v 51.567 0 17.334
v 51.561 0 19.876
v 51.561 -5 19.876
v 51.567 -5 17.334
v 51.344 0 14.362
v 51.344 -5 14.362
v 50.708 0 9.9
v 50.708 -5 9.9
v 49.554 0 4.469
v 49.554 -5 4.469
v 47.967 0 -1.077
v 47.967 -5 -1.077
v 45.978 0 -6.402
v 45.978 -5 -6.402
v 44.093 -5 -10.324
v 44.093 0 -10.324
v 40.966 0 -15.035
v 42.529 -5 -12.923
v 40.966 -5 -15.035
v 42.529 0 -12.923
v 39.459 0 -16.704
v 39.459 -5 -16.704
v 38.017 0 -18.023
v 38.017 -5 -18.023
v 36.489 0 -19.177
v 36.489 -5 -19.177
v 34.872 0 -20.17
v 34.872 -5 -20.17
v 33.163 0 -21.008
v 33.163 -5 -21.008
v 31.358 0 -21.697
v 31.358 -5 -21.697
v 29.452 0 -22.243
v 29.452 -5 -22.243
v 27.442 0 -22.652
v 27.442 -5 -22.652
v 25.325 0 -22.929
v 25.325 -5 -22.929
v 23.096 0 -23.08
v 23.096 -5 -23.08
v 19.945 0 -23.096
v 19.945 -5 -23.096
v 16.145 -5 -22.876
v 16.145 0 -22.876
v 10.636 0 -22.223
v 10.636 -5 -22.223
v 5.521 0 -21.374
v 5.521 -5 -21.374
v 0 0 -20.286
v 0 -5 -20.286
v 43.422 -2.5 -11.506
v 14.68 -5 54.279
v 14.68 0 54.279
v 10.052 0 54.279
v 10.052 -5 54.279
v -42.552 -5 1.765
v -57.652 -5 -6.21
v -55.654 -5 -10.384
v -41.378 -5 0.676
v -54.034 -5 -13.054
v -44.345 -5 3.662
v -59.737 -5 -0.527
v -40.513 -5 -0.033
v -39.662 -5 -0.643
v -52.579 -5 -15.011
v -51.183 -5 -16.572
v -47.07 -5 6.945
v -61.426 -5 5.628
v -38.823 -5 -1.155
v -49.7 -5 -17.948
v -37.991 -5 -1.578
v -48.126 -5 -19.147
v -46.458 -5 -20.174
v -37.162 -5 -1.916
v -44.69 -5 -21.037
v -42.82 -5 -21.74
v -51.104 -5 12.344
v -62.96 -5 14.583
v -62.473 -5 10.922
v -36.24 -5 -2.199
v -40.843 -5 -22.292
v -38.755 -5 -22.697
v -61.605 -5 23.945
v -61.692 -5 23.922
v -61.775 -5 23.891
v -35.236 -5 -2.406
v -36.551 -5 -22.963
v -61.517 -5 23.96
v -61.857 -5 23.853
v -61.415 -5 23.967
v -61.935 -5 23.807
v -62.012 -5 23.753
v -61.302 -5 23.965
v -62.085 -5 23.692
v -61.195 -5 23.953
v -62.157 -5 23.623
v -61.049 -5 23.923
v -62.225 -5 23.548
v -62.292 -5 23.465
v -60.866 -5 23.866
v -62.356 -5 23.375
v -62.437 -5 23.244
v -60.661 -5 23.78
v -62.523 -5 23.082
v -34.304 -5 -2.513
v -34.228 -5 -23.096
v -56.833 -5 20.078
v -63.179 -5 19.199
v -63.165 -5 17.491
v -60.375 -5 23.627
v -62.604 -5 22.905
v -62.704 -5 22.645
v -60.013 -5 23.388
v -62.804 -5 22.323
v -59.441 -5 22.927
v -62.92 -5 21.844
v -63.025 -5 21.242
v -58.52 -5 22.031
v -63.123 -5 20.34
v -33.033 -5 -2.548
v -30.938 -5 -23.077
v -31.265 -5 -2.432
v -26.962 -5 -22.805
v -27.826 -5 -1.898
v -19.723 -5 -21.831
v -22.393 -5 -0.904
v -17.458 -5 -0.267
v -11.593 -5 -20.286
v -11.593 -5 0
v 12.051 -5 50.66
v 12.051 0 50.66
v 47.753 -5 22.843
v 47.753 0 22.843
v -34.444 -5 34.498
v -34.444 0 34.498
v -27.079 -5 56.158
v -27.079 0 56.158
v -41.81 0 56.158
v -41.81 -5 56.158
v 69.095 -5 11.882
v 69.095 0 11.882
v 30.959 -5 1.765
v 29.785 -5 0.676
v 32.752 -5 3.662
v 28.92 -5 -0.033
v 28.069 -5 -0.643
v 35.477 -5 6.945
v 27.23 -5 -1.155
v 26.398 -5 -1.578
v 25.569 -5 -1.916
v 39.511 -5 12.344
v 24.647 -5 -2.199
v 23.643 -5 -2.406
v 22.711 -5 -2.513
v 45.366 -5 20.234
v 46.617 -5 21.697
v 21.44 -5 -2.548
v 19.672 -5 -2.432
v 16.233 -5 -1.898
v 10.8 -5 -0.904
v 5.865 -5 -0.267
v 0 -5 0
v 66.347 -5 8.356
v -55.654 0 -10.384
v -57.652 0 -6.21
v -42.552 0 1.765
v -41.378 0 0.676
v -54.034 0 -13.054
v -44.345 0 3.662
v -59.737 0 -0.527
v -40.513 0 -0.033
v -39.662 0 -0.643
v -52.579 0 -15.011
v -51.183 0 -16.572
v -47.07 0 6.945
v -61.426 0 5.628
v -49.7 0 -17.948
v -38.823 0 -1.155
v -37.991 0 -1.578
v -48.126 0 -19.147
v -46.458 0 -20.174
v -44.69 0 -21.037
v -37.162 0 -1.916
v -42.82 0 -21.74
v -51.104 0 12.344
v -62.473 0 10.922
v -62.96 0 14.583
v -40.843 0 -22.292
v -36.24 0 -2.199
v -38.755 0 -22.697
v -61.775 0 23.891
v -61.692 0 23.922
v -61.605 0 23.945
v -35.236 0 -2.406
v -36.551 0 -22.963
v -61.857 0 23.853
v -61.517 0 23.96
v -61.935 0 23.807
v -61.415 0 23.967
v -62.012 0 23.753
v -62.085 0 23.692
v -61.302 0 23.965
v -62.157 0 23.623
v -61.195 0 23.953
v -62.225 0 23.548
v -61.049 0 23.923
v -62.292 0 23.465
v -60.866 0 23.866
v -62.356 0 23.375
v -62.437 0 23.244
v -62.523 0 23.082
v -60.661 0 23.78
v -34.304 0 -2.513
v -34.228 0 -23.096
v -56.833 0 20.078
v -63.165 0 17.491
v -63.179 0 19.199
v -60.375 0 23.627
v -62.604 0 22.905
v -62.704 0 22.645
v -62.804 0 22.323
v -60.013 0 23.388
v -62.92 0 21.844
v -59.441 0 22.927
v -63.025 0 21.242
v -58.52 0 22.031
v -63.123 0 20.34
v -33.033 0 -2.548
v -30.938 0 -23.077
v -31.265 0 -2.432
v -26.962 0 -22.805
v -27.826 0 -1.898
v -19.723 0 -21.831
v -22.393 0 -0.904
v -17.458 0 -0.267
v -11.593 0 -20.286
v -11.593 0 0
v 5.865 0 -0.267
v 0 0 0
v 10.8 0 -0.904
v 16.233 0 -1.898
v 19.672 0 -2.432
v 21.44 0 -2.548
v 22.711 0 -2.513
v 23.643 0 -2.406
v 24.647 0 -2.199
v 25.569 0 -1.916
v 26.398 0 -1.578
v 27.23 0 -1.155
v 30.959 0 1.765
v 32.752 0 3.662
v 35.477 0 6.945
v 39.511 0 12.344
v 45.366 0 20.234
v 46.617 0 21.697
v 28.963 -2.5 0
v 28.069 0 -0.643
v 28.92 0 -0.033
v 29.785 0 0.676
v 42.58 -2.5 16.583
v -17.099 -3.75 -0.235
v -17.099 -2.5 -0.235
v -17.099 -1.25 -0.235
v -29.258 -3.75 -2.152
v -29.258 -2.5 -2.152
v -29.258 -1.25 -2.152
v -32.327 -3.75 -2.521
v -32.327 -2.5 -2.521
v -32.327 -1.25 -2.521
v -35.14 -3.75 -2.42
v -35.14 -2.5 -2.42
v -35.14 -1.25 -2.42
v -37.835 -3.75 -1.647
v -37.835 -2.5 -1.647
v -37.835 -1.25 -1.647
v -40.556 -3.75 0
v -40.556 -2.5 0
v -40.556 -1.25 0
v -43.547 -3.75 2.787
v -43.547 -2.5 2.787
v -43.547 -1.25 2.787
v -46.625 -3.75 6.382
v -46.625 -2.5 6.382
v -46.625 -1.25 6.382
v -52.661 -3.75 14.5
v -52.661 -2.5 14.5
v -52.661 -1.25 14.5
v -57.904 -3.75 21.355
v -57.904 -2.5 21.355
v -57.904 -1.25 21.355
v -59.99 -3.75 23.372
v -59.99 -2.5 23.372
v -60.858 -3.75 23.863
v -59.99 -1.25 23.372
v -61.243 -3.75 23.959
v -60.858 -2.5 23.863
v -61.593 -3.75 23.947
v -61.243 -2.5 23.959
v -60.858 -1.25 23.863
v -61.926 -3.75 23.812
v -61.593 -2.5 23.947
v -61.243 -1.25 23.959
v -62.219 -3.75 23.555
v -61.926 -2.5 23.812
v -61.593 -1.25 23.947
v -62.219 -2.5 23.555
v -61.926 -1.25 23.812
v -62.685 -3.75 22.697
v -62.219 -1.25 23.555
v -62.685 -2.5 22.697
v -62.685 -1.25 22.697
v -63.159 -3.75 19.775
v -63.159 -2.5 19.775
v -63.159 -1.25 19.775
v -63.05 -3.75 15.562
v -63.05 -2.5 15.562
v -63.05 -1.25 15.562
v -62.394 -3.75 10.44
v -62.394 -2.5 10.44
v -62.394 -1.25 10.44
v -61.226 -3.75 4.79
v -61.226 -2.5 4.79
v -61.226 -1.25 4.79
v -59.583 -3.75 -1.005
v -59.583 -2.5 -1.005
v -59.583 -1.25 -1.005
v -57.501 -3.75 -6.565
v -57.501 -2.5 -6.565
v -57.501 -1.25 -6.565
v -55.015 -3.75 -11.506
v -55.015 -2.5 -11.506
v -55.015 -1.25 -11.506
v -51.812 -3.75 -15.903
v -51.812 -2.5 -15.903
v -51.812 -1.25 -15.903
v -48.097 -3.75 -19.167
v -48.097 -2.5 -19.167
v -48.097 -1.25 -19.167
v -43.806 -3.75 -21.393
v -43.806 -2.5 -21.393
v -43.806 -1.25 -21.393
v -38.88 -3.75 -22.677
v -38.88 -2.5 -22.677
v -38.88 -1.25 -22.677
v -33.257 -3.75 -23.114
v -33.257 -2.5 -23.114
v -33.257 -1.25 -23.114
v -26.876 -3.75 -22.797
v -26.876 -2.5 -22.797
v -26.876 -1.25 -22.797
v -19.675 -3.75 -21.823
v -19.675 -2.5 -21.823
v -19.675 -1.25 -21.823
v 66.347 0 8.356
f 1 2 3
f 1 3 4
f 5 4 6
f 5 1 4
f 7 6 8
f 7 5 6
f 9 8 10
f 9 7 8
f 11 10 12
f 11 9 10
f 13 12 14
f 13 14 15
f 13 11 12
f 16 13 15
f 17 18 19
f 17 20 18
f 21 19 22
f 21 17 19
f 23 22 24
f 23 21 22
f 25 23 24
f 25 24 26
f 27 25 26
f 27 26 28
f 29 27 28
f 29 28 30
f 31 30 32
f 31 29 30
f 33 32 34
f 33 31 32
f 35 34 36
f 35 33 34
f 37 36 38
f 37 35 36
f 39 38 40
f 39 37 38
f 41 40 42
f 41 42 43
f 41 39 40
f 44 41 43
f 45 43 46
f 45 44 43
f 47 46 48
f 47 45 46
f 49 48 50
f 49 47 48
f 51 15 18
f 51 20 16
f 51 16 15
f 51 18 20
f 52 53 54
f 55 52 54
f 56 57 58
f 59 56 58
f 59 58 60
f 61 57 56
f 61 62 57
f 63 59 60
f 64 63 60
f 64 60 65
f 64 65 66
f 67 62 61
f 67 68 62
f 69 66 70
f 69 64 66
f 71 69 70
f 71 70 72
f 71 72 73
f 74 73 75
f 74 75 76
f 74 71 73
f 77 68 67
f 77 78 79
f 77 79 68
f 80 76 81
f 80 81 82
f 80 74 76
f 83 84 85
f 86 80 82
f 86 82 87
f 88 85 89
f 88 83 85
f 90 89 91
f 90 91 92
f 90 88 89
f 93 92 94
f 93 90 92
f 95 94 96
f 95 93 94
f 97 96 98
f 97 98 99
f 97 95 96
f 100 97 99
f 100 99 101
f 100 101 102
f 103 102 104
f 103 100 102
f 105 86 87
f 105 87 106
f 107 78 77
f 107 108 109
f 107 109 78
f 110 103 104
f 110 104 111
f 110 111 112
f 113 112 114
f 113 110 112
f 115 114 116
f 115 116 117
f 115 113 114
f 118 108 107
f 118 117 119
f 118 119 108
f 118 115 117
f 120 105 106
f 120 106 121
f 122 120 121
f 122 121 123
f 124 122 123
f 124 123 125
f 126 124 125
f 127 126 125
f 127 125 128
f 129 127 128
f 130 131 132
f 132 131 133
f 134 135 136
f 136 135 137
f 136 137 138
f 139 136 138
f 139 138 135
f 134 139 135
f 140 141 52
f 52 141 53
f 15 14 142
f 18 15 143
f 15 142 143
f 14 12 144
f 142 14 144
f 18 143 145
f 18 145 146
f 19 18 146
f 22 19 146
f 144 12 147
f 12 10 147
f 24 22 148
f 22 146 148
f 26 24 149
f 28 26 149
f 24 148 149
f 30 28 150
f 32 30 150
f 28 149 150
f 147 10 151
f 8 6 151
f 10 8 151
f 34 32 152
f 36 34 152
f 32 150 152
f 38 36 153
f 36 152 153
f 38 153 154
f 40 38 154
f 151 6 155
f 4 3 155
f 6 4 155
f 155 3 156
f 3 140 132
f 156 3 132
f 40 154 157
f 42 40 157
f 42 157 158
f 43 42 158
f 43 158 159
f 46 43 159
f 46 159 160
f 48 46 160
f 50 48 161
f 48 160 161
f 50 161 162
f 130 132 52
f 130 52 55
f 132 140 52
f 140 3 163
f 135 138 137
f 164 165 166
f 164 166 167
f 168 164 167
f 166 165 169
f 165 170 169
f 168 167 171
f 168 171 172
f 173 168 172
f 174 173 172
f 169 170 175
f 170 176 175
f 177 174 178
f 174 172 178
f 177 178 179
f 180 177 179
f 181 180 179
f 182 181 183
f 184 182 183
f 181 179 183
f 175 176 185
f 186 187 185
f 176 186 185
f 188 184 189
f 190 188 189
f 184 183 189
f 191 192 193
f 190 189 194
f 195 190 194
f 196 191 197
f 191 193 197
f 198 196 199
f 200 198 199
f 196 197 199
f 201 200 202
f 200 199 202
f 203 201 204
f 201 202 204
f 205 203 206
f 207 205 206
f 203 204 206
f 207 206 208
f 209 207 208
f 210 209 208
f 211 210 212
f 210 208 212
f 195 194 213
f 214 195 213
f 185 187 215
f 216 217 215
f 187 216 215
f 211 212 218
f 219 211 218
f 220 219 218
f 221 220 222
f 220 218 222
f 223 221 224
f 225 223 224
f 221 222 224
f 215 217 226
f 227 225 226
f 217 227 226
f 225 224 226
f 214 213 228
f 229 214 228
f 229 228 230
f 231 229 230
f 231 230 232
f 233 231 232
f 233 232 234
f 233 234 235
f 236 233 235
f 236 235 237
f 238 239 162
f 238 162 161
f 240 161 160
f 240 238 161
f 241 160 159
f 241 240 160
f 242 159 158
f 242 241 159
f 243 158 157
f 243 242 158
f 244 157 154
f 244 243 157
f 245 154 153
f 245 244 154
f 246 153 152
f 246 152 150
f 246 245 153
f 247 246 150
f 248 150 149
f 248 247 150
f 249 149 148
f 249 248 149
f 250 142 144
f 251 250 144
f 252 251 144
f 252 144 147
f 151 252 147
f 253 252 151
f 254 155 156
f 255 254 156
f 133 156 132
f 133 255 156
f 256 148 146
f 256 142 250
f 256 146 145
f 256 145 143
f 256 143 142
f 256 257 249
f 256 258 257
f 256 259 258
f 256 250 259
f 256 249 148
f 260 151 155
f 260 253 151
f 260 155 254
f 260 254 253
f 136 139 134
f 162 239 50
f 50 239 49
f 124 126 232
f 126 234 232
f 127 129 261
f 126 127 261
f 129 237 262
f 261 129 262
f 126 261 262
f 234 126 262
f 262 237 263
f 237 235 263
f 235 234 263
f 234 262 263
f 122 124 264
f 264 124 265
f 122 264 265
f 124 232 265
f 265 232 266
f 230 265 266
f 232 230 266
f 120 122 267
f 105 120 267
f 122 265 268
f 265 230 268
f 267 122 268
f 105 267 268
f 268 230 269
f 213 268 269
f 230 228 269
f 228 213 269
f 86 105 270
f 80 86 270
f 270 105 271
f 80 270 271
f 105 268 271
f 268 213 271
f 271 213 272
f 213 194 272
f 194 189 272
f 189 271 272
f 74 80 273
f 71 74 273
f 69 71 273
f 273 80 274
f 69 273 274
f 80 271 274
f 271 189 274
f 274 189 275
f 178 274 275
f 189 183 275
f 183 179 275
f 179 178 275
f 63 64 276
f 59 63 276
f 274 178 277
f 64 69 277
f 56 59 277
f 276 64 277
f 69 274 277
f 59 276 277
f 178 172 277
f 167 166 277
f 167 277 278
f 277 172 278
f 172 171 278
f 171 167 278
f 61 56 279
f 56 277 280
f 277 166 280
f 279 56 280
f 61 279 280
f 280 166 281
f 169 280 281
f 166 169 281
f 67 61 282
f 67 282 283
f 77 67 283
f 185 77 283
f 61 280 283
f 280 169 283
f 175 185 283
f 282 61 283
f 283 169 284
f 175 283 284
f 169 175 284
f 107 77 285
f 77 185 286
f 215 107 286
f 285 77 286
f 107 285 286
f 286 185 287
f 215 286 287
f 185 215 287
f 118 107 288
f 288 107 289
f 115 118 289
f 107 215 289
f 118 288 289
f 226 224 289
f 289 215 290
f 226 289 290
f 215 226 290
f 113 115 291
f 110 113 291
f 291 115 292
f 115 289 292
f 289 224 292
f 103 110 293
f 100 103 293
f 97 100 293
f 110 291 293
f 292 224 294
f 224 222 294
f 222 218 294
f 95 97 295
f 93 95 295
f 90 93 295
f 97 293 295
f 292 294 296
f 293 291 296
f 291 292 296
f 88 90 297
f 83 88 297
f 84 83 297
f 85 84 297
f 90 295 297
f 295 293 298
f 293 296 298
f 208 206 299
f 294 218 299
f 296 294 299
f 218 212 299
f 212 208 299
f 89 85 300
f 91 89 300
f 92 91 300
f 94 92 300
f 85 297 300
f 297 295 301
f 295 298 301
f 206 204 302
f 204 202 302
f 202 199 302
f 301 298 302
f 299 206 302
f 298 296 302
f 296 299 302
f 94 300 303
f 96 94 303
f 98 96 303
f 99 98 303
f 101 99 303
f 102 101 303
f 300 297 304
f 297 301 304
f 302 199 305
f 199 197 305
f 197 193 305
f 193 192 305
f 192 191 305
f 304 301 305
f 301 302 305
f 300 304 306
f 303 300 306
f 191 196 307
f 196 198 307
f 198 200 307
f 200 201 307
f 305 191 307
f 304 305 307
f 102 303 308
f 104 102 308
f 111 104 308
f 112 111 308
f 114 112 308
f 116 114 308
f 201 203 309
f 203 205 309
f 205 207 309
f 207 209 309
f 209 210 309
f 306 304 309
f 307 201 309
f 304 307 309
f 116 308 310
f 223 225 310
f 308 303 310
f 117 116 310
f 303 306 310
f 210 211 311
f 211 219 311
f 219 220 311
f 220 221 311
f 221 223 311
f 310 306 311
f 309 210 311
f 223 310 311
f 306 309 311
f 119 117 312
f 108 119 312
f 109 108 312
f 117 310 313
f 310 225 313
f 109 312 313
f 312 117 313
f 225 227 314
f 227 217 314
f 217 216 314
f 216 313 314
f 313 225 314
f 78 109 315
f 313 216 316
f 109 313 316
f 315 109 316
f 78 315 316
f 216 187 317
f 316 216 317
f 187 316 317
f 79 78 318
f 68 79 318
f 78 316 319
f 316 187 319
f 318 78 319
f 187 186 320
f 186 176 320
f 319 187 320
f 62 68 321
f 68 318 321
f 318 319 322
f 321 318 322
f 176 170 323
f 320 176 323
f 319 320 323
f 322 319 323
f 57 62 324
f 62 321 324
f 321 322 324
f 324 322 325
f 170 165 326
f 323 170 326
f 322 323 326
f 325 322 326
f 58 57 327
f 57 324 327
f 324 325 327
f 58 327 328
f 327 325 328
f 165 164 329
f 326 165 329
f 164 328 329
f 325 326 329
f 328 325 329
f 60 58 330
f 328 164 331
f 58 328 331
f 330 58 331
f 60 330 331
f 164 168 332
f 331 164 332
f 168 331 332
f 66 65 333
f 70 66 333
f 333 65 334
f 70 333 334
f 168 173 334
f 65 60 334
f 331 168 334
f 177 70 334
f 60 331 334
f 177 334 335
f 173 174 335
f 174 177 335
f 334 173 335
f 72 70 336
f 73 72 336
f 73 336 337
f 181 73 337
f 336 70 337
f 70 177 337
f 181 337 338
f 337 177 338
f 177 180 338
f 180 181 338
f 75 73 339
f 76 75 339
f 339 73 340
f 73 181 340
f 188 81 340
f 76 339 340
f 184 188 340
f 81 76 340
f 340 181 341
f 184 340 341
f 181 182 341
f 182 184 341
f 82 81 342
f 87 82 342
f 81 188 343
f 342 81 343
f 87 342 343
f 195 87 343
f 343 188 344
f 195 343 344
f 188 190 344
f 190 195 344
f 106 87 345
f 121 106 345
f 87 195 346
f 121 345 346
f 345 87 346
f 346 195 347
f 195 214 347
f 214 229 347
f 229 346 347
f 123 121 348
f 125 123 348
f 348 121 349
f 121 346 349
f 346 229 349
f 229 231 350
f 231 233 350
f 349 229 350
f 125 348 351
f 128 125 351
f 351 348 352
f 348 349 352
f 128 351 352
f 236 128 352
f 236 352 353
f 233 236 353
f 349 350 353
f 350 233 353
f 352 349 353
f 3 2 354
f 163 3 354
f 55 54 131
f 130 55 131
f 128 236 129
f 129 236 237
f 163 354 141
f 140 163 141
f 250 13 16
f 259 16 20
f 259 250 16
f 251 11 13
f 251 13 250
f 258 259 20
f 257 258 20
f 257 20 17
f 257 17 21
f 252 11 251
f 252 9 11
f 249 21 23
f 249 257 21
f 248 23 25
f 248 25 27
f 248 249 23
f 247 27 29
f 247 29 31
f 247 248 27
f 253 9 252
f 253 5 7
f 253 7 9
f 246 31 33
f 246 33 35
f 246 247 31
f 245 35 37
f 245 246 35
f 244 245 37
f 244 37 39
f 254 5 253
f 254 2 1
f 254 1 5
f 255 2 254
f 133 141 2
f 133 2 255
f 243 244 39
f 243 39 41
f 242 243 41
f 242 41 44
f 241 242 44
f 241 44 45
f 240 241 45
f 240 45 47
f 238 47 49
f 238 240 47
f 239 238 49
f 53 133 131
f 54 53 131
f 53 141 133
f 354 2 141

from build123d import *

# Parameters (mm, degrees)
F1_DEPTH = 5


with BuildPart() as f1:
    # F0 (on Front) → F1 (new body)
    with BuildSketch(Plane.XZ):
        with BuildLine():
            add(Edge.make_bspline(
                [(0, 0), (15.9015151371, 0), (26.4899665265, -10.7539190788), (43.2731033817, 18.8059254272), (47.753190481, 22.8430924697)],
                knots=[0, 0, 0, 0, 0.2271887895, 0.425837087, 0.425837087, 0.425837087, 0.425837087], degree=3))
            Line((0, 0), (0, -20.2858335729))
            add(Edge.make_bspline(
                [(51.5609638692, 19.8762996779), (51.9481337767, 12.6527851468), (44.16658315, -24.6715949147), (22.7806904614, -25.0505565737), (0, -20.2858335729)],
                knots=[0.5280104609, 0.5280104609, 0.5280104609, 0.5280104609, 0.7190237466, 1, 1, 1, 1], degree=3))
            Line((51.5609638692, 19.8762996779), (47.753190481, 22.8430924697))
        make_face()
        with BuildLine():
            Line((12.0509136468, 50.6602041423), (47.753190481, 22.8430924697))
            add(Edge.make_bspline(
                [(47.753190481, 22.8430924697), (48.6483085535, 23.649715444), (50.6084428251, 24.7240186276), (51.4343142158, 22.2392302507), (51.5609638692, 19.8762996779)],
                knots=[0.425837087, 0.425837087, 0.425837087, 0.425837087, 0.4655268692, 0.5280104609, 0.5280104609, 0.5280104609, 0.5280104609], degree=3))
            Line((51.5609638692, 19.8762996779), (66.3471370935, 8.3557842299))
            Line((66.3471370935, 8.3557842299), (69.0945762663, 11.8820250232))
            Line((69.0945762663, 11.8820250232), (14.6800910727, 54.2785875245))
            Line((14.6800910727, 54.2785875245), (10.0522795692, 54.2785875245))
            Line((10.0522795692, 54.2785875245), (12.0509136468, 50.6602041423))
        make_face()
        with BuildLine():
            add(Edge.make_bspline(
                [(47.753190481, 22.8430924697), (48.6483085535, 23.649715444), (50.6084428251, 24.7240186276), (51.4343142158, 22.2392302507), (51.5609638692, 19.8762996779)],
                knots=[0.425837087, 0.425837087, 0.425837087, 0.425837087, 0.4655268692, 0.5280104609, 0.5280104609, 0.5280104609, 0.5280104609], degree=3))
            Line((47.753190481, 22.8430924697), (51.5609638692, 19.8762996779))
        make_face()
    extrude(amount=F1_DEPTH)


with BuildPart() as f1b:
    # F0 (on Front) → F1, piece 2 (new body)
    with BuildSketch(Plane.XZ):
        with BuildLine():
            Line((-11.593026109, -20.2858335729), (-11.593026109, 0))
            add(Edge.make_bspline(
                [(-11.593026109, 0), (-27.4945412461, 0), (-39.0698802089, -11.7562289268), (-68.3830079959, 44.4997850165), (-58.5907469778, -24.6214266724), (-34.3737165704, -25.0505565737), (-11.593026109, -20.2858335729)],
                knots=[0, 0, 0, 0, 0.2271887895, 0.4655268692, 0.7190237466, 1, 1, 1, 1], degree=3))
        make_face()
    extrude(amount=F1_DEPTH)


with BuildPart() as f1c:
    # F0 (on Front) → F1, piece 3 (new body)
    with BuildSketch(Plane.XZ):
        Polygon((-27.0791046494, 56.1581999063), (-41.8100565533, 56.1581999063), (-34.4443290206, 34.4983536023), align=None)
    extrude(amount=F1_DEPTH)


solid = Compound([f1.part, f1b.part, f1c.part])
